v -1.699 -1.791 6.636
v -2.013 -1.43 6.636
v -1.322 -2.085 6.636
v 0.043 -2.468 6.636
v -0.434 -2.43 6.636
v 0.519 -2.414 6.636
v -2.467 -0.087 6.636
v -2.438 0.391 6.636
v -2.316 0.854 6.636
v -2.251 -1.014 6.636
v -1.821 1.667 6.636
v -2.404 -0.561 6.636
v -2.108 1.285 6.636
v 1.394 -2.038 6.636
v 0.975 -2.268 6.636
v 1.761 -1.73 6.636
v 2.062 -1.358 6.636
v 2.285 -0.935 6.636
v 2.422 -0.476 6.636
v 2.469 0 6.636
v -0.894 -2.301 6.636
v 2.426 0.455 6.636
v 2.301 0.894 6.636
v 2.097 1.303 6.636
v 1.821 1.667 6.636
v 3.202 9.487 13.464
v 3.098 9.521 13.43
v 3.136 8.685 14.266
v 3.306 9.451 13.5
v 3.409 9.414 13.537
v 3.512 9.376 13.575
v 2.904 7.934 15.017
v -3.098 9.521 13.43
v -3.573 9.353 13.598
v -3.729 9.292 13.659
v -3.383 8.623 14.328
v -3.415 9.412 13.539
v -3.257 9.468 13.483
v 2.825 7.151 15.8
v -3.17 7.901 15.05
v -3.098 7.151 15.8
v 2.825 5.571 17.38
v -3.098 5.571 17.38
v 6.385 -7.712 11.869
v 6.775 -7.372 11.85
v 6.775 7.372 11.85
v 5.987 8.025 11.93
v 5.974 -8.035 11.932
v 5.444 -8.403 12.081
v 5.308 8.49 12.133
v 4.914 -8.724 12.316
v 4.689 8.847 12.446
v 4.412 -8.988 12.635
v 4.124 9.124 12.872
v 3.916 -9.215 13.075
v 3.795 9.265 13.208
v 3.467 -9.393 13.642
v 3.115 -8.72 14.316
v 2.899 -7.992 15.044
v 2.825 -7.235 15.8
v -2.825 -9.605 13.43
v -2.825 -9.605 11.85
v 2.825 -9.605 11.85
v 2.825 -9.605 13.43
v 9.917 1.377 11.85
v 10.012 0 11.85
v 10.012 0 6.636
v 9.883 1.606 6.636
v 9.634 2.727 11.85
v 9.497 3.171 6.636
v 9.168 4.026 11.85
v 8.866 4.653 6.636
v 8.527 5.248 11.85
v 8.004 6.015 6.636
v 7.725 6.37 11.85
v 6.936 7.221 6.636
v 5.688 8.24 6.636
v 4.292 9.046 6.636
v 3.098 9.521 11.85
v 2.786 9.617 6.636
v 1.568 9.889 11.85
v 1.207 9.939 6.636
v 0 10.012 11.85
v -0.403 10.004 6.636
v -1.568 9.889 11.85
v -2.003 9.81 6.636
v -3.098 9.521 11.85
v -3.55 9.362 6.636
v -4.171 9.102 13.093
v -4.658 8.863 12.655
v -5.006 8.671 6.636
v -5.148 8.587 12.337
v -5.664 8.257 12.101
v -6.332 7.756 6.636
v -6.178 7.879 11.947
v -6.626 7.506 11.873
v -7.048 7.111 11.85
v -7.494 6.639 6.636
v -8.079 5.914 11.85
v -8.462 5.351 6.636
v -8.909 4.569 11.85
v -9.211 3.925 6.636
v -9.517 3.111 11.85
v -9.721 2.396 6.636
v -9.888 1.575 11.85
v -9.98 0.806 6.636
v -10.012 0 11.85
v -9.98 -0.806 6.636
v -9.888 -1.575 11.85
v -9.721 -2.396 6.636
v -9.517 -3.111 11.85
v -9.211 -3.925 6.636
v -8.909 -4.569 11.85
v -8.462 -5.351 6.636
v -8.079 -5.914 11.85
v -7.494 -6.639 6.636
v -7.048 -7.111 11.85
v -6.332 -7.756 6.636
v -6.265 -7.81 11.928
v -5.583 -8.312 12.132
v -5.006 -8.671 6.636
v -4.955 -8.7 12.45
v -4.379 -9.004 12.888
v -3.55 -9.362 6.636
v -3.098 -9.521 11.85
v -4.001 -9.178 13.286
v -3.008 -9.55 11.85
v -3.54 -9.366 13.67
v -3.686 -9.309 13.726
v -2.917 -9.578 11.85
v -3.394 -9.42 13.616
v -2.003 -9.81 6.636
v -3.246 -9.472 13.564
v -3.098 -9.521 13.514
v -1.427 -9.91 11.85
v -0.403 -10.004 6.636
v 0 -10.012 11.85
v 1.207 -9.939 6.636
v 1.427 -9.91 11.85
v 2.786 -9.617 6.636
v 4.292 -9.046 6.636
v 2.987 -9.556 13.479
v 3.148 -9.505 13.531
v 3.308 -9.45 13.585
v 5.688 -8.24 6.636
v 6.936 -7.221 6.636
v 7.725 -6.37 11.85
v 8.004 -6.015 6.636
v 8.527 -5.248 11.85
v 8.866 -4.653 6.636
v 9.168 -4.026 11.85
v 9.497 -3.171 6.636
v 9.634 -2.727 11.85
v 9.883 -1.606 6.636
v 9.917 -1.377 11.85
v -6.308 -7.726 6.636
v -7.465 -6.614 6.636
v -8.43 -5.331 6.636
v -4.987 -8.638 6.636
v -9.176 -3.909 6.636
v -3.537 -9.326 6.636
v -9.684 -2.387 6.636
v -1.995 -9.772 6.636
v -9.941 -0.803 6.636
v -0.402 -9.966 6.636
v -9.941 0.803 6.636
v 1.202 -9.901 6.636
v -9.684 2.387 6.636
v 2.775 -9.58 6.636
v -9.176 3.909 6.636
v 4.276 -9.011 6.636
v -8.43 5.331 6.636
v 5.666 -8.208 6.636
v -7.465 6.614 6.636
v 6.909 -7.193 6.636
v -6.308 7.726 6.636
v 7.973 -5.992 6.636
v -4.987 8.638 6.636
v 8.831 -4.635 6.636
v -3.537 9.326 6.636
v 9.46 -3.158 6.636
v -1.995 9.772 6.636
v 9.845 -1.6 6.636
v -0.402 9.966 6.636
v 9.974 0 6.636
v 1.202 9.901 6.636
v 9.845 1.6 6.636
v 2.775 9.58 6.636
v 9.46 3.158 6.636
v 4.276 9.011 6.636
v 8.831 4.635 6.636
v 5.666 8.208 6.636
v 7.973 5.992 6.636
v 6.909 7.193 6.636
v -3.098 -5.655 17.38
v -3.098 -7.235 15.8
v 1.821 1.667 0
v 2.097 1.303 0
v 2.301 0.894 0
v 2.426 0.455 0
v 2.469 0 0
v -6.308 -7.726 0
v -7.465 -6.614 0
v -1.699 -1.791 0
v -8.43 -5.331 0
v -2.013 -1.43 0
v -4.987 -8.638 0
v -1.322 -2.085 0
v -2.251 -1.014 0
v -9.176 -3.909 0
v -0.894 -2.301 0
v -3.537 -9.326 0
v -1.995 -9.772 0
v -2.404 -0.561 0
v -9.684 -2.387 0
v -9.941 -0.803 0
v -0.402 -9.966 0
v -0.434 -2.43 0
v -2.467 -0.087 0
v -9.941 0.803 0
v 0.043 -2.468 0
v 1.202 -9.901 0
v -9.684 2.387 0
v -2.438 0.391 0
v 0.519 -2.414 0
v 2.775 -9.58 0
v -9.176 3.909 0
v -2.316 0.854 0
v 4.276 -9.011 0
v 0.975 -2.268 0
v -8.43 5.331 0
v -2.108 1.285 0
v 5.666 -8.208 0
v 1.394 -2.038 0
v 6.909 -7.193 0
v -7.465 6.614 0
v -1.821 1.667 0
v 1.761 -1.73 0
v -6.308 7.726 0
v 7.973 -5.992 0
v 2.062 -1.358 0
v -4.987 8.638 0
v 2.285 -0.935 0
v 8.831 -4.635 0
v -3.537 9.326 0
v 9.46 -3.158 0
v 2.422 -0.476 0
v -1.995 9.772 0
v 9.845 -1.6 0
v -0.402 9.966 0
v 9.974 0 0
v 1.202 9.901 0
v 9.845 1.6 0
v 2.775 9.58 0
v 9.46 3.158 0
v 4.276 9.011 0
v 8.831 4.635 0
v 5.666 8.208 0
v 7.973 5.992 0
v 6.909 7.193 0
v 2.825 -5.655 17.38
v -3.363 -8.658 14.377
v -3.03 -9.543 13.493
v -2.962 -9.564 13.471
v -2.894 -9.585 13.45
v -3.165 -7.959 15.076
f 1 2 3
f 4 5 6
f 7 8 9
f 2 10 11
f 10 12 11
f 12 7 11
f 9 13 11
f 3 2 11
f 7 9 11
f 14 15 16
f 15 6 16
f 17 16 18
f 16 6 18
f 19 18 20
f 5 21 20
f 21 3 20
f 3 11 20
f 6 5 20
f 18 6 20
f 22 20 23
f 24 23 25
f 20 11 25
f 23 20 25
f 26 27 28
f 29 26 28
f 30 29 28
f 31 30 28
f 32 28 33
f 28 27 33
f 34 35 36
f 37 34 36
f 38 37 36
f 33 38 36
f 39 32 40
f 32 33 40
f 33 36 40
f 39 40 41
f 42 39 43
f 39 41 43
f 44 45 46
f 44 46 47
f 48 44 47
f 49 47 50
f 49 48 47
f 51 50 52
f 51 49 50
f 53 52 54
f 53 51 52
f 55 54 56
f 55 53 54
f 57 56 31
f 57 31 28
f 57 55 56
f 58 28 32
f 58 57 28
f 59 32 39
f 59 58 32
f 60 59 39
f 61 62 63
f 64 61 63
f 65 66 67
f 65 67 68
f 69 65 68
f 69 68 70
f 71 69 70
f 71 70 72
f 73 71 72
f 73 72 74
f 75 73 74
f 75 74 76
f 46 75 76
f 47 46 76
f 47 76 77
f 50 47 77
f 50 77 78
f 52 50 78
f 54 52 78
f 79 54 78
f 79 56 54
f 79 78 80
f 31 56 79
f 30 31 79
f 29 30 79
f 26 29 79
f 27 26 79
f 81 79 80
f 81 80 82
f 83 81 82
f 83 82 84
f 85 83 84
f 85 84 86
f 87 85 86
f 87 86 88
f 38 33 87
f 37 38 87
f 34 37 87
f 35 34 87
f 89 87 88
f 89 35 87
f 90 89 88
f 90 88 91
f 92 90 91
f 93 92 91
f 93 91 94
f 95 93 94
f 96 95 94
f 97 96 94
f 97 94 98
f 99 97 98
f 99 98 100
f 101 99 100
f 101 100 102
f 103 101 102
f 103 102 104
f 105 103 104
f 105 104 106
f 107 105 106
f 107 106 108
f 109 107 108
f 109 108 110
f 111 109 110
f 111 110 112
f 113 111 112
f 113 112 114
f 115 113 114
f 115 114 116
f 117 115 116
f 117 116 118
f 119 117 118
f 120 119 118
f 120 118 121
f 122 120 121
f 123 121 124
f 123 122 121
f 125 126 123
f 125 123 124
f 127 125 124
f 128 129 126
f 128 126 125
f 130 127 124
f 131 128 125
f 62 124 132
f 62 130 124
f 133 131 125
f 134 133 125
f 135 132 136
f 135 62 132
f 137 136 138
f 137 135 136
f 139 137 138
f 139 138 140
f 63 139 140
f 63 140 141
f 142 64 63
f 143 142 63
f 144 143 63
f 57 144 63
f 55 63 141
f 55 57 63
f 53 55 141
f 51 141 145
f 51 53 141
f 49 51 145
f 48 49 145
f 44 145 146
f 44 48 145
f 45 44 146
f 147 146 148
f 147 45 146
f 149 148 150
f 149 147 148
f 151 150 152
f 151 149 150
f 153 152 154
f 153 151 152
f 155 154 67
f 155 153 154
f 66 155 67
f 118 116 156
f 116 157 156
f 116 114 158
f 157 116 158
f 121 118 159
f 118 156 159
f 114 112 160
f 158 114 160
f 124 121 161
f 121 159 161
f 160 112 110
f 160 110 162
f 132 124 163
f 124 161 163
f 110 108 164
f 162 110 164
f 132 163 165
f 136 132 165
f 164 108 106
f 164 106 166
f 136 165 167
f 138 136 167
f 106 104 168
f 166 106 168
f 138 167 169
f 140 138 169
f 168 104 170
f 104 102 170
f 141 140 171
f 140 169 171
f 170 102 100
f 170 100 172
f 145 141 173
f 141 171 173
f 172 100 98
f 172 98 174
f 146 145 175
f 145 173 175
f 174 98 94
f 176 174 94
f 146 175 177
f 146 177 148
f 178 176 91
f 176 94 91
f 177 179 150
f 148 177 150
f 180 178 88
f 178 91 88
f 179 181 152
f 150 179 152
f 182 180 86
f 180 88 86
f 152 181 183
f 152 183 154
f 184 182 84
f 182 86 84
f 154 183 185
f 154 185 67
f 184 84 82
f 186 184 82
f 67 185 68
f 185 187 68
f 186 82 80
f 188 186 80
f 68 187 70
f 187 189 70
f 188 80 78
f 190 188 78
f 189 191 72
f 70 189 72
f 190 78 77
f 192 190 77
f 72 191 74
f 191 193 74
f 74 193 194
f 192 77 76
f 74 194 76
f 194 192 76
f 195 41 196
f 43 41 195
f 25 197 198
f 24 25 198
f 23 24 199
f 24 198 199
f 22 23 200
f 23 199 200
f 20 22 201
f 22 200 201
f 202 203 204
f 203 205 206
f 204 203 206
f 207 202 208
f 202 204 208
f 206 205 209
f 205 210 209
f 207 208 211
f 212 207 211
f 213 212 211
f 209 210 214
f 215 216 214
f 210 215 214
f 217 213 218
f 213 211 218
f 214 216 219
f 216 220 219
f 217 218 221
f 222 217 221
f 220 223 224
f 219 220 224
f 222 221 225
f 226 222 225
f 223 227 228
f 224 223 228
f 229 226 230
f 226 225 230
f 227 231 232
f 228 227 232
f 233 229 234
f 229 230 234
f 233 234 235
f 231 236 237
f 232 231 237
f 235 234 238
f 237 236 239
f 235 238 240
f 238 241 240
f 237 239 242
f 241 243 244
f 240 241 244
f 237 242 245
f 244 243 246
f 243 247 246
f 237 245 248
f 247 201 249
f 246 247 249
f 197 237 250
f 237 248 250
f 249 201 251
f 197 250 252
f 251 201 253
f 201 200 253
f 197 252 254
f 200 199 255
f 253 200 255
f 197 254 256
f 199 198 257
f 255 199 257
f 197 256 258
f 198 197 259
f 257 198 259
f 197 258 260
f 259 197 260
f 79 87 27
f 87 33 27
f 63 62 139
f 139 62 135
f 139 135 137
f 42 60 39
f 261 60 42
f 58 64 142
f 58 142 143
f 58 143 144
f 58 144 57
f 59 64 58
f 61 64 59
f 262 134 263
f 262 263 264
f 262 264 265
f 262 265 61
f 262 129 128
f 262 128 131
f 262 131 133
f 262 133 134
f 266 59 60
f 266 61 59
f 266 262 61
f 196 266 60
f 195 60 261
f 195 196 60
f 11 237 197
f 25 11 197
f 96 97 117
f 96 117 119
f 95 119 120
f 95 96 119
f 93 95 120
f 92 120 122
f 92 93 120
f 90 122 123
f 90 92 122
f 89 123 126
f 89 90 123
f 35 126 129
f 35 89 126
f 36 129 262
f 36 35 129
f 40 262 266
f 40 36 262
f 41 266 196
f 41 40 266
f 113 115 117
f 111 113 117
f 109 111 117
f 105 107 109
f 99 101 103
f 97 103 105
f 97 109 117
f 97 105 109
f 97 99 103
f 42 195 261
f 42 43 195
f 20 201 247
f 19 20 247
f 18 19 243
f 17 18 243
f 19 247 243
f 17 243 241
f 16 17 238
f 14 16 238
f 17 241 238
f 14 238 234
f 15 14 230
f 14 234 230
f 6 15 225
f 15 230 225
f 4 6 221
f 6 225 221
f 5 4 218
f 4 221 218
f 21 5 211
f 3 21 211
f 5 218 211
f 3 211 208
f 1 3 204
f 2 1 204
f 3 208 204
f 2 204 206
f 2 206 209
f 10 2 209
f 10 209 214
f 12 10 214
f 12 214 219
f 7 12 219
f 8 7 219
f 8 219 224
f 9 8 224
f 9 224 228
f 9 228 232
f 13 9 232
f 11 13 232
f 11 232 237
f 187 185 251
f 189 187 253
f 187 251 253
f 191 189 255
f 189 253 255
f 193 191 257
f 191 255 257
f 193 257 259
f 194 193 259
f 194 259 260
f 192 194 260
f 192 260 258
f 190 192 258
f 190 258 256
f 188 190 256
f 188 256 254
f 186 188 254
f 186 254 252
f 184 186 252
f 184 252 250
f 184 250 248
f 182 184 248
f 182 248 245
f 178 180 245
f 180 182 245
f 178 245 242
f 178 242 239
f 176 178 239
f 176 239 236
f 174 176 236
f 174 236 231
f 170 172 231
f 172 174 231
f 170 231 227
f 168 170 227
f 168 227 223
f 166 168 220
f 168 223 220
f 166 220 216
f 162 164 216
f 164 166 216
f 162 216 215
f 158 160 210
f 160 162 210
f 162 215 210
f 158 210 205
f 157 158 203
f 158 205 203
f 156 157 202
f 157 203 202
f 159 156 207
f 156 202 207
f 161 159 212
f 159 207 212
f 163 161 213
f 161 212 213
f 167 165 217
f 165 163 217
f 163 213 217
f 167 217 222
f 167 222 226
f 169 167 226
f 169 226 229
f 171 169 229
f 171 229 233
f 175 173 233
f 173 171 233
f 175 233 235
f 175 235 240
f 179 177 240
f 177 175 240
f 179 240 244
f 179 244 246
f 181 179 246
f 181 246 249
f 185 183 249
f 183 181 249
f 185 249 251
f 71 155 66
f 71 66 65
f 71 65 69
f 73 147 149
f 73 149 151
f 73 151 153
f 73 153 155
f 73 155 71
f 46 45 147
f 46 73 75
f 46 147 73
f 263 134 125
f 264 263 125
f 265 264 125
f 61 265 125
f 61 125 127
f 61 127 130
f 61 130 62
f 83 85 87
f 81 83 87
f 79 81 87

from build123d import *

# Parameters (mm, degrees)
F0_R         = 12.625
F0_R_2       = 10.375
F0_R_3       = 5
F1_DEPTH     = 15
F2_DEPTH     = 15
F3_R         = 12.6739646699
F4_DEPTH     = 6.6
F6_DEPTH     = 7
F7_T4_DEPTH  = 36.6039255786
F7_S5_R      = 12.6739646699
F7_T6_DEPTH  = 20
F7_T10_DEPTH = 24.210816556
F7_S11_R     = 12.6739646699
F7_T12_DEPTH = 14
F8_T1_DEPTH  = 32.8699146781
F9_T1_DEPTH  = 33.2150521969
F10_SCALE    = 0.79


# Not quite as in the source:
# - a fillet or chamfer that OpenCascade refuses, or shapes differently, is made with other operations: its cross-section is extruded or revolved along the edge and cut away or added
# - a feature names something its author has since deleted; it is built from what else it names


with BuildPart() as f1:
    # F0 (on Top) → F1 (new body)
    with BuildSketch(Plane.XY):
        Circle(F0_R)
        Circle(F0_R_2, mode=Mode.SUBTRACT)
        Circle(F0_R_2)
        Circle(F0_R_3, mode=Mode.SUBTRACT)
    extrude(amount=F1_DEPTH)

    # F0 (on Top) → F2 (join)
    with BuildSketch(Plane.XY):
        Circle(F0_R_3)
        with BuildLine():
            ThreePointArc((2.304625, 2.1105280404), (2.9126944678, 1.1321819366), (3.125, 0))
            ThreePointArc((3.125, 0), (-1.1321819366, -2.9126944678), (-2.304625, 2.1105280404))
            ThreePointArc((-2.304625, 2.1105280404), (0, 3.125), (2.304625, 2.1105280404))
        make_face(mode=Mode.SUBTRACT)
        with BuildLine():
            Line((-2.304625, 2.1105280404), (2.304625, 2.1105280404))
            ThreePointArc((2.304625, 2.1105280404), (0, 3.125), (-2.304625, 2.1105280404))
        make_face()
    extrude(amount=F2_DEPTH)

    # F3 (on face) → F4 (join)
    with BuildSketch(Plane.XY.offset(15)):
        Circle(F3_R)
    extrude(amount=-F4_DEPTH)

    # F5 (on face) → F6 (join)
    with BuildSketch(Plane.XY.offset(15)):
        with BuildLine():
            Line((3.5765423992, 12.0519627893), (-3.921679918, 12.0519627893))
            Line((-3.921679918, 12.0519627893), (-3.921679918, -12.0519627893))
            ThreePointArc((-3.921679918, -12.0519627893), (-3.7494920856, -12.1066382433), (-3.5765423992, -12.1588537667))
            Line((-3.5765423992, -12.1588537667), (3.5765423992, -12.1588537667))
            Line((3.5765423992, -12.1588537667), (3.5765423992, 12.0519627893))
        make_face()
    extrude(amount=F6_DEPTH)

    # F7: fillet of radius 5 on 2 edges, made by hand


with BuildPart() as f7_tool2:
    # F7_s3 → F7_t4 (new body)
    with BuildSketch(Plane.XZ.offset(-12.0519627893)):
        with BuildLine():
            ThreePointArc((-8.921679918, 15), (-5.3861460121, 16.4644660941), (-3.921679918, 20))
            Line((-3.921679918, 20), (-3.921679918, 15))
            Line((-3.921679918, 15), (-8.921679918, 15))
        make_face()
    extrude(amount=F7_T4_DEPTH)

    # F7_s5 → F7_t6 (intersect, symmetric)
    with BuildSketch(Plane.XY.offset(17.5)):
        Circle(F7_S5_R)
    extrude(amount=F7_T6_DEPTH, both=True, mode=Mode.INTERSECT)


with BuildPart() as f1_1:
    add(f1.part)

    # F7_t1: union F7_tool2
    add(f7_tool2.part)


with BuildPart() as f7_tool8:
    # F7_s9 → F7_t10 (new body)
    with BuildSketch(Plane.XZ.offset(12.1588537667)):
        with BuildLine():
            ThreePointArc((8.5765423992, 15), (5.0410084933, 16.4644660941), (3.5765423992, 20))
            Line((3.5765423992, 20), (3.5765423992, 15))
            Line((3.5765423992, 15), (8.5765423992, 15))
        make_face()
    extrude(amount=-F7_T10_DEPTH)

    # F7_s11 → F7_t12 (intersect, symmetric)
    with BuildSketch(Plane.XY.offset(17.5)):
        Circle(F7_S11_R)
    extrude(amount=F7_T12_DEPTH, both=True, mode=Mode.INTERSECT)


with BuildPart() as f1_2:
    add(f1_1.part)

    # F7_t7: union F7_tool8
    add(f7_tool8.part)

    # F8: chamfer of 5 on 1 edges, made by hand

    # F8_s2 → F8_t1 (cut)
    with BuildSketch(Plane.YZ.offset(-16.434957339)):
        Polygon((-12.1588537667, 17), (-7.1588537667, 22), (-12.1588537667, 22), align=None)
    extrude(amount=F8_T1_DEPTH, mode=Mode.SUBTRACT)

    # F9: chamfer of 5 on 1 edges, made by hand

    # F9_s2 → F9_t1 (cut)
    with BuildSketch(Plane.YZ.offset(-16.7800948578)):
        Polygon((12.0519627893, 17), (7.0519627893, 22), (12.0519627893, 22), align=None)
    extrude(amount=F9_T1_DEPTH, mode=Mode.SUBTRACT)


with BuildPart() as f1_3:
    # F10: moved
    add(f1_2.part.scale(F10_SCALE))


solid = f1_3.part
